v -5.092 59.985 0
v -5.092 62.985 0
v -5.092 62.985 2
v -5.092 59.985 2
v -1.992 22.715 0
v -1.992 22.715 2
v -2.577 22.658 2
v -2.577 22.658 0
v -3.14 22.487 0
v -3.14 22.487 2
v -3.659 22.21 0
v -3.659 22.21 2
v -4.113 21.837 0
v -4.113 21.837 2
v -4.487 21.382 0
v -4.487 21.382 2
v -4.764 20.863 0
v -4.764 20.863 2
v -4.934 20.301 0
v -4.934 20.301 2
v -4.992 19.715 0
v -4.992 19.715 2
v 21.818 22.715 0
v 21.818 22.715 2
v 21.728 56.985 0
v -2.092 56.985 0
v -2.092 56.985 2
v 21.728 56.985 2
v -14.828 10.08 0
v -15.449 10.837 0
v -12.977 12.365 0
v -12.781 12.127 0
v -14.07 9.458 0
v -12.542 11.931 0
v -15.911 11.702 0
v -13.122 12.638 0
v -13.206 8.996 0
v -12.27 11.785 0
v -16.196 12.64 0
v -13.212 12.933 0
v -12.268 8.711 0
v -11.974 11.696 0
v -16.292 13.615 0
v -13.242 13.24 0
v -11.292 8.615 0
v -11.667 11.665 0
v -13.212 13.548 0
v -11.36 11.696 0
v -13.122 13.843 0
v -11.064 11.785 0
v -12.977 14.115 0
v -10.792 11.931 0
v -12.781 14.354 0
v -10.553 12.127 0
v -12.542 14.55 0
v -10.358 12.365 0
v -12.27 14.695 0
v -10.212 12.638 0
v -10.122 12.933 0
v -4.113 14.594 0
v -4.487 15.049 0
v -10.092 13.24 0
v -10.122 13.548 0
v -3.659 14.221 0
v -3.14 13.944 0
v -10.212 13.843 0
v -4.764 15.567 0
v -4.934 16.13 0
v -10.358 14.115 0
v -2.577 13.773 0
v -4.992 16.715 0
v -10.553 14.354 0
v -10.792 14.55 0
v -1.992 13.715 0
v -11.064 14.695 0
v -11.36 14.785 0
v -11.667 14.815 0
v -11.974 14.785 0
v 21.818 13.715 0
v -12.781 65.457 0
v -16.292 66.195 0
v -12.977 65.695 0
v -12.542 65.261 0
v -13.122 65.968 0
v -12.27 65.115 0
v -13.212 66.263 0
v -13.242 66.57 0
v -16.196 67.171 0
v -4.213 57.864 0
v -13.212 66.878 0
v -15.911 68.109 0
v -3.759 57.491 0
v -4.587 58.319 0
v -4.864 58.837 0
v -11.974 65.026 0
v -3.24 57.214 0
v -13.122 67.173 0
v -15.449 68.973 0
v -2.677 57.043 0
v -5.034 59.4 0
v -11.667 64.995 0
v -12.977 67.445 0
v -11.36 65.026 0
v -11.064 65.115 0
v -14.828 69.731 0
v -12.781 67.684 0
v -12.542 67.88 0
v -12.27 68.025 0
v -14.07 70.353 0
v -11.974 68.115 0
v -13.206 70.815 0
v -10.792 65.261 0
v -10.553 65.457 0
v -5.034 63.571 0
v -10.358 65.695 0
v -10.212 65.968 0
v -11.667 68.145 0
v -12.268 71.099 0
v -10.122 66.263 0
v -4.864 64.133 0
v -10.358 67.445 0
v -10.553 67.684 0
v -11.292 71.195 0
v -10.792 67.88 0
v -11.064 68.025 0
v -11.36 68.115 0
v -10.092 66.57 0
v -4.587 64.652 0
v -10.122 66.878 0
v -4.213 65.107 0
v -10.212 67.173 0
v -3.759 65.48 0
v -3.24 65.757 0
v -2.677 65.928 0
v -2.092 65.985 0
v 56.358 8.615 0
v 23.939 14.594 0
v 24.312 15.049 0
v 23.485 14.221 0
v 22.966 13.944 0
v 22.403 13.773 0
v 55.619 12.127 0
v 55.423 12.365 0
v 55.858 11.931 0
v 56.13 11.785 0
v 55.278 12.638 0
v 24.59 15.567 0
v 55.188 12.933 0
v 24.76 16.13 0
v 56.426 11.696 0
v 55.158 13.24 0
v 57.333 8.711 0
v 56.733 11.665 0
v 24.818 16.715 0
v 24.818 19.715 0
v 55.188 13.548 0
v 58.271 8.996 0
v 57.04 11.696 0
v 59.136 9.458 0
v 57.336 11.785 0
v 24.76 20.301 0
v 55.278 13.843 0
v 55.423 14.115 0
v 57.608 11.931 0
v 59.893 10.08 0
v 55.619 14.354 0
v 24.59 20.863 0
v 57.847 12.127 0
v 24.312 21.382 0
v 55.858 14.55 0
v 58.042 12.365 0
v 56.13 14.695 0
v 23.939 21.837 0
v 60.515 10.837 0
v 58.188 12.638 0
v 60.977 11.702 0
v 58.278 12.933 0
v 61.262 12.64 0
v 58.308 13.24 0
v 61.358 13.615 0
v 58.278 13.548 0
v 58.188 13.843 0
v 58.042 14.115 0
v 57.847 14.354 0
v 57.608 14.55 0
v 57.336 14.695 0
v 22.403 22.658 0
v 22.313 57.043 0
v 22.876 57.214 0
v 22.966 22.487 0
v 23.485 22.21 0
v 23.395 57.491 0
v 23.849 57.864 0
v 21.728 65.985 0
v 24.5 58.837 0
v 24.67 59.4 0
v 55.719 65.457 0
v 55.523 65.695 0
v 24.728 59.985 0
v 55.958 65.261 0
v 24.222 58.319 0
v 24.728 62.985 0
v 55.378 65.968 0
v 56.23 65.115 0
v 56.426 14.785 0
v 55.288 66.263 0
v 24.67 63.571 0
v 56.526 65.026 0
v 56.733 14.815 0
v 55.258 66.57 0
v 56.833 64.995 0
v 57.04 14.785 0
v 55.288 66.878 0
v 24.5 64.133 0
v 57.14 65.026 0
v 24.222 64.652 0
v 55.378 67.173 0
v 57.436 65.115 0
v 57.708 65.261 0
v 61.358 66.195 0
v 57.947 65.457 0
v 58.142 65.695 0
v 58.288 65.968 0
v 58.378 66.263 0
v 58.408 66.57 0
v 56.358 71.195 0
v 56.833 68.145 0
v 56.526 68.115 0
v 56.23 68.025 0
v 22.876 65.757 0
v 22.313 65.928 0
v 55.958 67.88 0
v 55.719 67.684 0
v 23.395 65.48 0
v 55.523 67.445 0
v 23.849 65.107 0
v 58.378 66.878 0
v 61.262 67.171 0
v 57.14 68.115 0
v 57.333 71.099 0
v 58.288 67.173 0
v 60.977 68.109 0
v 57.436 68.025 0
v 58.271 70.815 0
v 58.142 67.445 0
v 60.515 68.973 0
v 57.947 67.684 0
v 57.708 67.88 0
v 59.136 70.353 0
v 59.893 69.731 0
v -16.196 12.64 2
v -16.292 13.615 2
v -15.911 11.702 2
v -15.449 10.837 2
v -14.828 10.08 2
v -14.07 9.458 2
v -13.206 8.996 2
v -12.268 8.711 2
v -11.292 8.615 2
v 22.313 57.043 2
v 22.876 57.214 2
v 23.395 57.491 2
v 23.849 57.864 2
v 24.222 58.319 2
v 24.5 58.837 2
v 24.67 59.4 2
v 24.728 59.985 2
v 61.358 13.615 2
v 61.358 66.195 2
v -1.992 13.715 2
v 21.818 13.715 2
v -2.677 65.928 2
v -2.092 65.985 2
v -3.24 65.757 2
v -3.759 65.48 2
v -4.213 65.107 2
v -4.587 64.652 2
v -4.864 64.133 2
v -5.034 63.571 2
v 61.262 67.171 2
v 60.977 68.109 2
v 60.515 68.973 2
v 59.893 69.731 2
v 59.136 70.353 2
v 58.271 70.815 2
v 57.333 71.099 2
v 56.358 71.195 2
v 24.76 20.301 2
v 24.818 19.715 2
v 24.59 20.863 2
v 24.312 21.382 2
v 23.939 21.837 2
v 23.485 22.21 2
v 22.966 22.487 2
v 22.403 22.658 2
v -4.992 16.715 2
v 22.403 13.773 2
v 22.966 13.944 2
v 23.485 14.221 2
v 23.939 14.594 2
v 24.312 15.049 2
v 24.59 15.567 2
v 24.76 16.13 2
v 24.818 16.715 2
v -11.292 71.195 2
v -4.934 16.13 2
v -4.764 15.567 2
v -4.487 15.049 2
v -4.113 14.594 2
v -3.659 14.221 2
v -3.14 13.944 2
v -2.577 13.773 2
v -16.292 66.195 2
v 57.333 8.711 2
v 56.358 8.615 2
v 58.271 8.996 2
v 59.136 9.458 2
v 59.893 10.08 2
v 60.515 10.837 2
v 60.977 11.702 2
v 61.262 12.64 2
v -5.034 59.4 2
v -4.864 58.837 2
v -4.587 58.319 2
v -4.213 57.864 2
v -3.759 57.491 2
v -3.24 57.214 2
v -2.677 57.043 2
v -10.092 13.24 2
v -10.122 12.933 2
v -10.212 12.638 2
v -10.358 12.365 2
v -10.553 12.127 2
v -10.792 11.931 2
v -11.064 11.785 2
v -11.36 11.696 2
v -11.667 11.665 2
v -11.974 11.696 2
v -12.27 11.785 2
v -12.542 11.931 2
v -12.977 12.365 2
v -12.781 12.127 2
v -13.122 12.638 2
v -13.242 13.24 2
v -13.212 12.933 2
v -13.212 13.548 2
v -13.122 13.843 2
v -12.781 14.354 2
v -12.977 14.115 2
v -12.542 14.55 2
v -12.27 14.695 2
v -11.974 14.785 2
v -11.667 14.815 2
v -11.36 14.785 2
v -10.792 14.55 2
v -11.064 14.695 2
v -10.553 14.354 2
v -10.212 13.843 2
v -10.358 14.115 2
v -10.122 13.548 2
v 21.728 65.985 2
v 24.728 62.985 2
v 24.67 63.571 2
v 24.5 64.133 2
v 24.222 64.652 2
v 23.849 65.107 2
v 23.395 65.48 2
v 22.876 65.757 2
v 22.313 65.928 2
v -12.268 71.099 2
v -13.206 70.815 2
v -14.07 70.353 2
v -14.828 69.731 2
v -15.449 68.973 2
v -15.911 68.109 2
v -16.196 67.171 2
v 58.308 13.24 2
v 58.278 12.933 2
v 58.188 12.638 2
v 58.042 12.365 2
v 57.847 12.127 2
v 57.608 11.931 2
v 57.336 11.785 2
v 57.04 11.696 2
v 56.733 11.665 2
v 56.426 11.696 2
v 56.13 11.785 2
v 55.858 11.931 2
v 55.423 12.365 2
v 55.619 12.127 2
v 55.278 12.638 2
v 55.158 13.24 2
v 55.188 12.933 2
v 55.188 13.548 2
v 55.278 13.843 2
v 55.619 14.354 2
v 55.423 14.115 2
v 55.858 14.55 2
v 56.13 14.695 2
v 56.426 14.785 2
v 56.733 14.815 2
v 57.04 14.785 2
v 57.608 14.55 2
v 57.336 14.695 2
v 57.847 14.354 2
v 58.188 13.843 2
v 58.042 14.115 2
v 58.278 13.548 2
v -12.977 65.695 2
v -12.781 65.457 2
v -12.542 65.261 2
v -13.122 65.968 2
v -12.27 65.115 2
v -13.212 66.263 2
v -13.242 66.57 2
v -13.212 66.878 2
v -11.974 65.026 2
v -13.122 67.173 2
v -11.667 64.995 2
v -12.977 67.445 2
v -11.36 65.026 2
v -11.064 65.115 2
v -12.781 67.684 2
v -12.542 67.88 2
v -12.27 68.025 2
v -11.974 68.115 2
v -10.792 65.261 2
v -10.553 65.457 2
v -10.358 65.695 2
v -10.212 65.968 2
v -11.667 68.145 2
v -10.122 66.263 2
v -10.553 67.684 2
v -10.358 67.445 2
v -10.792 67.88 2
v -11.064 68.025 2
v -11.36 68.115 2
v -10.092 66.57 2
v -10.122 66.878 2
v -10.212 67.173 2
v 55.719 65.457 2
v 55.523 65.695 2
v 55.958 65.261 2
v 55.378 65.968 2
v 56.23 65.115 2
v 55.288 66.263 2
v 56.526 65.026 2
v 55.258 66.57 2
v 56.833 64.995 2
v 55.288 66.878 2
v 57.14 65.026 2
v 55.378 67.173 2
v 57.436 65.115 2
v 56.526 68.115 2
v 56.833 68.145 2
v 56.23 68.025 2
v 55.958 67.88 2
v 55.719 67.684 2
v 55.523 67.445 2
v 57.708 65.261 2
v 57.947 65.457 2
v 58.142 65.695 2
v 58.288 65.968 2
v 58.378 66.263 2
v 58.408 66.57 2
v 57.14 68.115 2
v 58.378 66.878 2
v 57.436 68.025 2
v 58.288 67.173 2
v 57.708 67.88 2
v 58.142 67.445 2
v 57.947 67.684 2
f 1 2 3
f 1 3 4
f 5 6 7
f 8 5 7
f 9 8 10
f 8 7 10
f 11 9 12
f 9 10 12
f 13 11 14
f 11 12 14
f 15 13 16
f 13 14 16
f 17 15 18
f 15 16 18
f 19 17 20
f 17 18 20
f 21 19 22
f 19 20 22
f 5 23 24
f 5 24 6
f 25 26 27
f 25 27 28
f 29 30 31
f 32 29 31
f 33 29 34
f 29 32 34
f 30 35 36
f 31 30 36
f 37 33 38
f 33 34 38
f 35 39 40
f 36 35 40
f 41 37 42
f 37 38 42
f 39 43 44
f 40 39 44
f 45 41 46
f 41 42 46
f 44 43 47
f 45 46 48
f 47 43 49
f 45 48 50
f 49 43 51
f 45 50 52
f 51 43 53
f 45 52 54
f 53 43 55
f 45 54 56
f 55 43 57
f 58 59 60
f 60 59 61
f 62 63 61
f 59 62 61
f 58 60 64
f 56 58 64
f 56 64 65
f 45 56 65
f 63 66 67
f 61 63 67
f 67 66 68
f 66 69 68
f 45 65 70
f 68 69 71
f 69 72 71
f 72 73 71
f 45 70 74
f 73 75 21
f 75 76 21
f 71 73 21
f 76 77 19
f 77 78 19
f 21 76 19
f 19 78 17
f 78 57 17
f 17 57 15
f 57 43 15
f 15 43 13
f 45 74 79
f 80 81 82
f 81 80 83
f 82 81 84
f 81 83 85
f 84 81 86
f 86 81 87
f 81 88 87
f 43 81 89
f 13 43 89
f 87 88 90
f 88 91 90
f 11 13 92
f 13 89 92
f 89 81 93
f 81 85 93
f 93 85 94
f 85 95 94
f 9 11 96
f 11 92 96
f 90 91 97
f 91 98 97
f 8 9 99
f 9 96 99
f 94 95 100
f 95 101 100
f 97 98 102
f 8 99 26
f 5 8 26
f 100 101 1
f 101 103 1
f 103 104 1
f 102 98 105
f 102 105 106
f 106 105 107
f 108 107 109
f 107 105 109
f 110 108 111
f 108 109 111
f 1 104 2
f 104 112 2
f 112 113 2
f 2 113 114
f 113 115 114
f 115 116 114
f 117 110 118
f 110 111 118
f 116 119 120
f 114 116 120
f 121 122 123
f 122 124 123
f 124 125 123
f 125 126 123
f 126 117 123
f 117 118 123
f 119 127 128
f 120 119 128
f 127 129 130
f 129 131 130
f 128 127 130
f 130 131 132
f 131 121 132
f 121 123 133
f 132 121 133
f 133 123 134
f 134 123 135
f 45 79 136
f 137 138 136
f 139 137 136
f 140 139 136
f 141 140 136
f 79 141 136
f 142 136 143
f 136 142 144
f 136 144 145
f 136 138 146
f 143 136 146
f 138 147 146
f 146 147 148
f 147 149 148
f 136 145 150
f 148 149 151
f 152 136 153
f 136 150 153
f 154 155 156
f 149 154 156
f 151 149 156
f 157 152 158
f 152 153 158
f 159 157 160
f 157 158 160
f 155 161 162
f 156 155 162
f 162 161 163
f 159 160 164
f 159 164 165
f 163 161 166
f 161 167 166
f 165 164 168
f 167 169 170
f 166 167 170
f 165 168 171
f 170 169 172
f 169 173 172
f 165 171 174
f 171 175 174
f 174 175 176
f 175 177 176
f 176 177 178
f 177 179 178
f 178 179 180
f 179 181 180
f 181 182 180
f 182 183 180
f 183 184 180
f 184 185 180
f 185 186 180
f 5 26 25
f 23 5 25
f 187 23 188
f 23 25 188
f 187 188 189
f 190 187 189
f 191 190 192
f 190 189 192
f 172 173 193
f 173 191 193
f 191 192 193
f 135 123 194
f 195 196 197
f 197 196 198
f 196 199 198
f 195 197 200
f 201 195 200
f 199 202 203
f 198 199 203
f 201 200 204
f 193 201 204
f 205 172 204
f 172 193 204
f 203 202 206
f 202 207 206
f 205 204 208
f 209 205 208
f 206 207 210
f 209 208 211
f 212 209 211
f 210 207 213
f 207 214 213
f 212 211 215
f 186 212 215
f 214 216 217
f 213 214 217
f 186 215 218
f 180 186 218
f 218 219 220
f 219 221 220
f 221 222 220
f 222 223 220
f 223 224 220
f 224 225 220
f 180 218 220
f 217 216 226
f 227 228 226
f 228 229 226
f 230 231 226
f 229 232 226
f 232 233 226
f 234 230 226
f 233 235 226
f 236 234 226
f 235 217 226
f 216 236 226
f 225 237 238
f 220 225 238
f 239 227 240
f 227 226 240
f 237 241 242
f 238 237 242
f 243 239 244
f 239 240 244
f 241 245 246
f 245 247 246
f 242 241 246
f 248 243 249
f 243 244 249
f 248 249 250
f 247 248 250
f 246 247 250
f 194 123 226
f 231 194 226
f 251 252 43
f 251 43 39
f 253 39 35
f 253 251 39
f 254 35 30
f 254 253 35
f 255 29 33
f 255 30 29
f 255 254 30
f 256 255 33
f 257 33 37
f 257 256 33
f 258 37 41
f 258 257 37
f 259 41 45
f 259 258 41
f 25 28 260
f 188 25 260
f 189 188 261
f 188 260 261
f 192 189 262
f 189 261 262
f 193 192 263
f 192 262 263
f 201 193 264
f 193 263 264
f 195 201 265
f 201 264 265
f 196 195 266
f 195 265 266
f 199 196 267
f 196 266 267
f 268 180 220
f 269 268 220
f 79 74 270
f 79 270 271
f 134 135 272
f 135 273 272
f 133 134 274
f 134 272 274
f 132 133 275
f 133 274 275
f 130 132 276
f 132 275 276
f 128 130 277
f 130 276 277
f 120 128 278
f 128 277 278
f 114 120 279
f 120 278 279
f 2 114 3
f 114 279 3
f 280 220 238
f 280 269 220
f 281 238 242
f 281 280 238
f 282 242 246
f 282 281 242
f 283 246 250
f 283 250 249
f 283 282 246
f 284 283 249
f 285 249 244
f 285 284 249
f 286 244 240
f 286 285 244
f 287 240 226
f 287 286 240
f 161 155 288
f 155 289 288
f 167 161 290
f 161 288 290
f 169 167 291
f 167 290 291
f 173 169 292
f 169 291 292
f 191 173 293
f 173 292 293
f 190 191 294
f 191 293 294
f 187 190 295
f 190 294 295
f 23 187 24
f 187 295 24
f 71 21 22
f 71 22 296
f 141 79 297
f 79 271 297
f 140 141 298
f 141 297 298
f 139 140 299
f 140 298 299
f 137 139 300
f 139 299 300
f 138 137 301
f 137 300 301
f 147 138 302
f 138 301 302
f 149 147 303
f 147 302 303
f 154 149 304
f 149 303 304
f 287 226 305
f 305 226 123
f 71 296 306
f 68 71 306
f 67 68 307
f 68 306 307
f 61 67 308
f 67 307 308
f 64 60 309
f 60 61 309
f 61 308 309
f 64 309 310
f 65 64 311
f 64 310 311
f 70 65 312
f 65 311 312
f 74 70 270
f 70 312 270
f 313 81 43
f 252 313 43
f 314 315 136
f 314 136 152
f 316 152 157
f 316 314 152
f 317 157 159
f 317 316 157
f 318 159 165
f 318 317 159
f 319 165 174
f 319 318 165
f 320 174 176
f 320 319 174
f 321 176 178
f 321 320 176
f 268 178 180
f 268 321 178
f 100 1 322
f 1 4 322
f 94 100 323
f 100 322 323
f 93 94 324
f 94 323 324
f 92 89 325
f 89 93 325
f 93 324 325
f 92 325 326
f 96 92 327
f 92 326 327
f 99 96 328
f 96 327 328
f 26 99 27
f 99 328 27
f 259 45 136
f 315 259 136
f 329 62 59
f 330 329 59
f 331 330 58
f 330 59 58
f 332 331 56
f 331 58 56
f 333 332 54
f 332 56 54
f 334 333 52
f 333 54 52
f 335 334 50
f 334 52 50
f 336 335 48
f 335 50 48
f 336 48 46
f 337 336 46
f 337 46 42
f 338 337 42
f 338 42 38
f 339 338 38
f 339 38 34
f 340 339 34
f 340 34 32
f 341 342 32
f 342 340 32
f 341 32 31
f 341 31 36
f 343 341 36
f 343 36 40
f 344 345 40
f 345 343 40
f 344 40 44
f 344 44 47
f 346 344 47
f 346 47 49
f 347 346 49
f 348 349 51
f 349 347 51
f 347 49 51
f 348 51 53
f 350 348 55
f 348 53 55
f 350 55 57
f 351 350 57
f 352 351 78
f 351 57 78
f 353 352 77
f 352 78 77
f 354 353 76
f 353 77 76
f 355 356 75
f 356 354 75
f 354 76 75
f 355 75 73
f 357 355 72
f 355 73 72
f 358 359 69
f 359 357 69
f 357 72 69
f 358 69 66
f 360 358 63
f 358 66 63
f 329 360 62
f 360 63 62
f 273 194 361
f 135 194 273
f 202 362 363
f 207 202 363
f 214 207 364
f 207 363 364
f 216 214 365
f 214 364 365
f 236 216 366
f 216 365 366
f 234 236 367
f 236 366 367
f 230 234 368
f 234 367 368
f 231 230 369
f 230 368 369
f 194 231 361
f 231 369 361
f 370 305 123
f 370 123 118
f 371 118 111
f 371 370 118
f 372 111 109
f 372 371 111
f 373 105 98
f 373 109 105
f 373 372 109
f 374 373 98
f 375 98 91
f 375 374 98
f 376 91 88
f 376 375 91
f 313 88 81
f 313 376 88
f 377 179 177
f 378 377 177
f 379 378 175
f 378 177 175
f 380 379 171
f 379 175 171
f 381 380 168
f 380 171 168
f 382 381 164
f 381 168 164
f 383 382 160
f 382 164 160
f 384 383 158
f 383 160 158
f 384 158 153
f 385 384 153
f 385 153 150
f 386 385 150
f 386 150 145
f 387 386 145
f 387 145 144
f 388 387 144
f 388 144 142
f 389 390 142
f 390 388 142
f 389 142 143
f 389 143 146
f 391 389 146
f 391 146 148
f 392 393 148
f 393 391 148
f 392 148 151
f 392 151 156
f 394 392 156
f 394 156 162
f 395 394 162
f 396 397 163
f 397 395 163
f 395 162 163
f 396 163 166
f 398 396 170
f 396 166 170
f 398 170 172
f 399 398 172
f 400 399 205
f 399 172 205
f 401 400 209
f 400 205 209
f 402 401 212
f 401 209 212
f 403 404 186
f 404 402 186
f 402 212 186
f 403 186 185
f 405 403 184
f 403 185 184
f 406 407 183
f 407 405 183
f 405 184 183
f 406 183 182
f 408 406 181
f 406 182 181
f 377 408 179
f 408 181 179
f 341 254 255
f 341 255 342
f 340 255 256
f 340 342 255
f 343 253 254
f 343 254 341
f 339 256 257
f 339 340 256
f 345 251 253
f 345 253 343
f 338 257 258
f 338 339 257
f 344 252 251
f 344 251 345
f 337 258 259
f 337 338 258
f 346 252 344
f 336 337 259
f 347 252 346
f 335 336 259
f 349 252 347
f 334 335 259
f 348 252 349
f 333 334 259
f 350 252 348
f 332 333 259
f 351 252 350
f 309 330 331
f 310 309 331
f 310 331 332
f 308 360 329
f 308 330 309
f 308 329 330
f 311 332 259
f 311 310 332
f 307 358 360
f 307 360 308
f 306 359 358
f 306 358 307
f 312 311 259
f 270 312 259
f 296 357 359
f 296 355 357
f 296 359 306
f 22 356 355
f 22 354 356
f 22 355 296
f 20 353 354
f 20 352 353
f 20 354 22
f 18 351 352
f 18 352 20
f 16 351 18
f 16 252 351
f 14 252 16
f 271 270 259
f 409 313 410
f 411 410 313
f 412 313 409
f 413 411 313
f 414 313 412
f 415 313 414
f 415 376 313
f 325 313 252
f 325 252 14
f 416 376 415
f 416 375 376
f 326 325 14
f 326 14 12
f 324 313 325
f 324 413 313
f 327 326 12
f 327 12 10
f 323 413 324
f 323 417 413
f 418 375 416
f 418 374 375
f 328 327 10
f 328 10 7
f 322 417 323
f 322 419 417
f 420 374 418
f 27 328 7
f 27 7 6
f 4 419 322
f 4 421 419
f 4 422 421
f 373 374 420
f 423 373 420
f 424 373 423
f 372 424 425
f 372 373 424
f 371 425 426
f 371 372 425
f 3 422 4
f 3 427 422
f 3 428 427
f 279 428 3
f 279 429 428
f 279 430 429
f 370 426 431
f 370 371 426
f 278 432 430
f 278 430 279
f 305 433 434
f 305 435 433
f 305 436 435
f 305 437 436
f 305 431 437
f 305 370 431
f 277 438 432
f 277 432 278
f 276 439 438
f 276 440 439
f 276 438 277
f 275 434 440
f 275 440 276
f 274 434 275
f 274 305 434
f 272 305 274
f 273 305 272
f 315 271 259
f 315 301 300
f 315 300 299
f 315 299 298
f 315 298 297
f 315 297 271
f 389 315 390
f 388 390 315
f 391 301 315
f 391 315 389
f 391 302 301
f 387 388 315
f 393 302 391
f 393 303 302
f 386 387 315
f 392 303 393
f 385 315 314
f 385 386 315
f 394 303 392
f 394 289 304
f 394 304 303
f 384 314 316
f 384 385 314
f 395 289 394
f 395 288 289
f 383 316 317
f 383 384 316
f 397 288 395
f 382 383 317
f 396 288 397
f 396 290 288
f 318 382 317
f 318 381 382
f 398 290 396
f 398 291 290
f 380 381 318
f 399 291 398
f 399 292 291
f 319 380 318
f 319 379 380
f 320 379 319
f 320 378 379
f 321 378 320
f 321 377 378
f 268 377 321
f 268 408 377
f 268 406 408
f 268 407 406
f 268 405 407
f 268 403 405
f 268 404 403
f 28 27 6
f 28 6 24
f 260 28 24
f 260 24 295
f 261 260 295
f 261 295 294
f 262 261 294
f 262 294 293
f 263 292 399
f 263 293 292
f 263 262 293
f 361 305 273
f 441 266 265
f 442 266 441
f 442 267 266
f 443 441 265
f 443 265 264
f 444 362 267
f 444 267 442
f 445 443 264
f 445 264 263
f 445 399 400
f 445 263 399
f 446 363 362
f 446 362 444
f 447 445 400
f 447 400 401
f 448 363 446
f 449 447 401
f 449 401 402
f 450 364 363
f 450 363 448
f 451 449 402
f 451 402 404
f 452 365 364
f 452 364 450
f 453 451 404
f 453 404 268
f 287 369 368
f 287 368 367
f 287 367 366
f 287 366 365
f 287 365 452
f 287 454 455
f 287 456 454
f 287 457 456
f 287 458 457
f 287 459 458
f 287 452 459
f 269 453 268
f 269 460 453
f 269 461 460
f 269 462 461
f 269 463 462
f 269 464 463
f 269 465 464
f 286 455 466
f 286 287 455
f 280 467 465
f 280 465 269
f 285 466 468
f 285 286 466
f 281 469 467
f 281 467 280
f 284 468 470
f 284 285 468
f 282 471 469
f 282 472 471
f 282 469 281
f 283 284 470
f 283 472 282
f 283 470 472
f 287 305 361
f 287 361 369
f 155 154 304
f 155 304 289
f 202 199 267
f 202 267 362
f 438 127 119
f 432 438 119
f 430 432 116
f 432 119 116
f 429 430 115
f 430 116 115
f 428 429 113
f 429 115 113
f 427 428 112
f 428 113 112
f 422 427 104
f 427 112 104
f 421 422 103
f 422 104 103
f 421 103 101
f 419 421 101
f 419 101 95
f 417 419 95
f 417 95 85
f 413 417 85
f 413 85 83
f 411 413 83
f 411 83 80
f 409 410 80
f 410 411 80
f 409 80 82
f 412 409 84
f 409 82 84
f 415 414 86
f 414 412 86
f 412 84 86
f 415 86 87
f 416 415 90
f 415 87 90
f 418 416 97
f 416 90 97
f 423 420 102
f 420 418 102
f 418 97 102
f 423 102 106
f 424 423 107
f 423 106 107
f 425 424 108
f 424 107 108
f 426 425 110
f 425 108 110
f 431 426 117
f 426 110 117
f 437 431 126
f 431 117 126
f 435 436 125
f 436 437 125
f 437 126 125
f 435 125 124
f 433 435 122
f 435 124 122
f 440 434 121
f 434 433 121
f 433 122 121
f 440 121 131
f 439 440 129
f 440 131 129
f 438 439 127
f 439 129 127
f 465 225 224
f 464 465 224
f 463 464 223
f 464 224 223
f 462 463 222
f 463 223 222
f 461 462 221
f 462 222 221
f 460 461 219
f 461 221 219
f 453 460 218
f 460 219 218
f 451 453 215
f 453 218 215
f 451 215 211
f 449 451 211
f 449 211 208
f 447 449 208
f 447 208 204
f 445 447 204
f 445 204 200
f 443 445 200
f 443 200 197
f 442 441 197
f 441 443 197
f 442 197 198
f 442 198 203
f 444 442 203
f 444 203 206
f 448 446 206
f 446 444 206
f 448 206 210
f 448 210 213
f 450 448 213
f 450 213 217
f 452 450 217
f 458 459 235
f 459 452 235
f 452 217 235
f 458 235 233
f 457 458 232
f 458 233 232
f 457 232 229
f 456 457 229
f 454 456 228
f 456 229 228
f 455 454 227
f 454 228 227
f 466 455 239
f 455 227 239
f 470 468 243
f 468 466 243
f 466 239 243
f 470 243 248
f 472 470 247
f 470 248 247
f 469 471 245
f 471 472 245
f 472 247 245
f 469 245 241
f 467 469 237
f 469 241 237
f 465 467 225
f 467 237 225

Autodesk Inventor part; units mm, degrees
ref_plane "YZ Plane" through (0, 0, 0) normal (1, 0, 0) x (0, 1, 0)
ref_plane "XZ Plane" through (0, 0, 0) normal (0, 1, 0) x (-1, 0, 0)
ref_plane "XY Plane" through (0, 0, 0) normal (0, 0, 1) x (1, 0, 0)
sketch "Kort" plane through (0, 0, 0) normal (0, 0, 1) x (1, 0, 0)
  line L0 (-3.0921, 63.9853) -> (22.7279, 63.9853)
  line L1 (22.7279, 63.9853) -> (22.7279, 58.9853)
  line L2 (22.7279, 58.9853) -> (-3.0921, 58.9853)
  line L3 (-3.0921, 58.9853) -> (-3.0921, 63.9853)
  line L4 (-2.9921, 20.7153) -> (22.8179, 20.7153)
  line L5 (22.8179, 20.7153) -> (22.8179, 15.7153)
  line L6 (22.8179, 15.7153) -> (-2.9921, 15.7153)
  line L7 (-2.9921, 15.7153) -> (-2.9921, 20.7153)
  line L8 (-14.2921, 69.1953) -> (59.3579, 69.1953)
  line L9 (-14.2921, 10.6153) -> (-14.2921, 69.1953)
  line L10 (59.3579, 10.6153) -> (-14.2921, 10.6153)
  line L11 (59.3579, 69.1953) -> (59.3579, 10.6153)
  circle A0 centre (56.8329, 66.5703) radius 1.575
  circle A1 centre (56.7329, 13.2403) radius 1.575
  circle A2 centre (-11.6671, 66.5703) radius 1.575
  circle A3 centre (-11.6671, 13.2403) radius 1.575
  line L12 (61.3579, 71.1953) -> (-16.2921, 71.1953)
  line L13 (-16.2921, 71.1953) -> (-16.2921, 8.6153)
  line L14 (-16.2921, 8.6153) -> (61.3579, 8.6153)
  line L15 (61.3579, 8.6153) -> (61.3579, 71.1953)
  line L16 (24.7279, 65.9853) -> (-5.0921, 65.9853)
  line L17 (-5.0921, 65.9853) -> (-5.0921, 56.9853)
  line L18 (-5.0921, 56.9853) -> (24.7279, 56.9853)
  line L19 (24.7279, 56.9853) -> (24.7279, 65.9853)
  line L20 (24.8179, 22.7153) -> (-4.9921, 22.7153)
  line L21 (-4.9921, 22.7153) -> (-4.9921, 13.7153)
  line L22 (-4.9921, 13.7153) -> (24.8179, 13.7153)
  line L23 (24.8179, 13.7153) -> (24.8179, 22.7153)
  point P0 (0, 0)
  dimension "d4" = 5.21
  dimension "d5" = 11.2
  dimension "d6" = 5.1
  dimension "d7" = 11.3
  dimension "d8" = 5
  dimension "d9" = 5
  dimension "d10" = 25.82
  dimension "d11" = 25.81
  dimension "d12" = 58.58
  dimension "d13" = 73.65
  dimension "d14" = 2.625
  dimension "d15" = 2.525
  dimension "d16" = 3.15
  dimension "d17" = 3.15
  dimension "d18" = 3.15
  dimension "d19" = 3.15
  dimension "d20" = 2.625
  dimension "d21" = 2.625
  dimension "d22" = 2.625
  dimension "d23" = 2.625
  dimension "d24" = 2.625
  dimension "d25" = 2.625
  dimension "d26" = 2
  dimension "d27" = 2
  dimension "d28" = 2
extrude "Bottom" add sketch "Kort" along normal blind 2 contours L8 L11 L10 L9 | L15 L14 L13 L12
fillet "Kantutjevning" radius 5 4 edges at (61.3579, 8.6153, 1) (61.3579, 71.1953, 1) (-16.2921, 71.1953, 1) (-16.2921, 8.6153, 1)
fillet "Hullkantutjevning" radius 3 8 edges at (-5.0921, 65.9853, 1) (-5.0921, 56.9853, 1) (24.7279, 65.9853, 1) (24.8179, 22.7153, 1) (24.7279, 56.9853, 1) (24.8179, 13.7153, 1) (-4.9921, 13.7153, 1) (-4.9921, 22.7153, 1)
equation "\"BendRadius\" = Thickness"
equation "\"BendReliefWidth\" = Thickness"
equation "\"BendReliefDepth\" = 0.5 * Thickness"
equation "\"CornerReliefSize\" = 4 * Thickness"
equation "\"MinimumRemnant\" = 2 * Thickness"
equation "\"TransitionRadius\" = BendRadius"
equation "\"JacobiRadiusSize\" = BendRadius"
equation "\"GapSize\" = Thickness"
equation "\"Thickness\" = 0.5"
properties part number "Trippeldekker_Nedre plate"
